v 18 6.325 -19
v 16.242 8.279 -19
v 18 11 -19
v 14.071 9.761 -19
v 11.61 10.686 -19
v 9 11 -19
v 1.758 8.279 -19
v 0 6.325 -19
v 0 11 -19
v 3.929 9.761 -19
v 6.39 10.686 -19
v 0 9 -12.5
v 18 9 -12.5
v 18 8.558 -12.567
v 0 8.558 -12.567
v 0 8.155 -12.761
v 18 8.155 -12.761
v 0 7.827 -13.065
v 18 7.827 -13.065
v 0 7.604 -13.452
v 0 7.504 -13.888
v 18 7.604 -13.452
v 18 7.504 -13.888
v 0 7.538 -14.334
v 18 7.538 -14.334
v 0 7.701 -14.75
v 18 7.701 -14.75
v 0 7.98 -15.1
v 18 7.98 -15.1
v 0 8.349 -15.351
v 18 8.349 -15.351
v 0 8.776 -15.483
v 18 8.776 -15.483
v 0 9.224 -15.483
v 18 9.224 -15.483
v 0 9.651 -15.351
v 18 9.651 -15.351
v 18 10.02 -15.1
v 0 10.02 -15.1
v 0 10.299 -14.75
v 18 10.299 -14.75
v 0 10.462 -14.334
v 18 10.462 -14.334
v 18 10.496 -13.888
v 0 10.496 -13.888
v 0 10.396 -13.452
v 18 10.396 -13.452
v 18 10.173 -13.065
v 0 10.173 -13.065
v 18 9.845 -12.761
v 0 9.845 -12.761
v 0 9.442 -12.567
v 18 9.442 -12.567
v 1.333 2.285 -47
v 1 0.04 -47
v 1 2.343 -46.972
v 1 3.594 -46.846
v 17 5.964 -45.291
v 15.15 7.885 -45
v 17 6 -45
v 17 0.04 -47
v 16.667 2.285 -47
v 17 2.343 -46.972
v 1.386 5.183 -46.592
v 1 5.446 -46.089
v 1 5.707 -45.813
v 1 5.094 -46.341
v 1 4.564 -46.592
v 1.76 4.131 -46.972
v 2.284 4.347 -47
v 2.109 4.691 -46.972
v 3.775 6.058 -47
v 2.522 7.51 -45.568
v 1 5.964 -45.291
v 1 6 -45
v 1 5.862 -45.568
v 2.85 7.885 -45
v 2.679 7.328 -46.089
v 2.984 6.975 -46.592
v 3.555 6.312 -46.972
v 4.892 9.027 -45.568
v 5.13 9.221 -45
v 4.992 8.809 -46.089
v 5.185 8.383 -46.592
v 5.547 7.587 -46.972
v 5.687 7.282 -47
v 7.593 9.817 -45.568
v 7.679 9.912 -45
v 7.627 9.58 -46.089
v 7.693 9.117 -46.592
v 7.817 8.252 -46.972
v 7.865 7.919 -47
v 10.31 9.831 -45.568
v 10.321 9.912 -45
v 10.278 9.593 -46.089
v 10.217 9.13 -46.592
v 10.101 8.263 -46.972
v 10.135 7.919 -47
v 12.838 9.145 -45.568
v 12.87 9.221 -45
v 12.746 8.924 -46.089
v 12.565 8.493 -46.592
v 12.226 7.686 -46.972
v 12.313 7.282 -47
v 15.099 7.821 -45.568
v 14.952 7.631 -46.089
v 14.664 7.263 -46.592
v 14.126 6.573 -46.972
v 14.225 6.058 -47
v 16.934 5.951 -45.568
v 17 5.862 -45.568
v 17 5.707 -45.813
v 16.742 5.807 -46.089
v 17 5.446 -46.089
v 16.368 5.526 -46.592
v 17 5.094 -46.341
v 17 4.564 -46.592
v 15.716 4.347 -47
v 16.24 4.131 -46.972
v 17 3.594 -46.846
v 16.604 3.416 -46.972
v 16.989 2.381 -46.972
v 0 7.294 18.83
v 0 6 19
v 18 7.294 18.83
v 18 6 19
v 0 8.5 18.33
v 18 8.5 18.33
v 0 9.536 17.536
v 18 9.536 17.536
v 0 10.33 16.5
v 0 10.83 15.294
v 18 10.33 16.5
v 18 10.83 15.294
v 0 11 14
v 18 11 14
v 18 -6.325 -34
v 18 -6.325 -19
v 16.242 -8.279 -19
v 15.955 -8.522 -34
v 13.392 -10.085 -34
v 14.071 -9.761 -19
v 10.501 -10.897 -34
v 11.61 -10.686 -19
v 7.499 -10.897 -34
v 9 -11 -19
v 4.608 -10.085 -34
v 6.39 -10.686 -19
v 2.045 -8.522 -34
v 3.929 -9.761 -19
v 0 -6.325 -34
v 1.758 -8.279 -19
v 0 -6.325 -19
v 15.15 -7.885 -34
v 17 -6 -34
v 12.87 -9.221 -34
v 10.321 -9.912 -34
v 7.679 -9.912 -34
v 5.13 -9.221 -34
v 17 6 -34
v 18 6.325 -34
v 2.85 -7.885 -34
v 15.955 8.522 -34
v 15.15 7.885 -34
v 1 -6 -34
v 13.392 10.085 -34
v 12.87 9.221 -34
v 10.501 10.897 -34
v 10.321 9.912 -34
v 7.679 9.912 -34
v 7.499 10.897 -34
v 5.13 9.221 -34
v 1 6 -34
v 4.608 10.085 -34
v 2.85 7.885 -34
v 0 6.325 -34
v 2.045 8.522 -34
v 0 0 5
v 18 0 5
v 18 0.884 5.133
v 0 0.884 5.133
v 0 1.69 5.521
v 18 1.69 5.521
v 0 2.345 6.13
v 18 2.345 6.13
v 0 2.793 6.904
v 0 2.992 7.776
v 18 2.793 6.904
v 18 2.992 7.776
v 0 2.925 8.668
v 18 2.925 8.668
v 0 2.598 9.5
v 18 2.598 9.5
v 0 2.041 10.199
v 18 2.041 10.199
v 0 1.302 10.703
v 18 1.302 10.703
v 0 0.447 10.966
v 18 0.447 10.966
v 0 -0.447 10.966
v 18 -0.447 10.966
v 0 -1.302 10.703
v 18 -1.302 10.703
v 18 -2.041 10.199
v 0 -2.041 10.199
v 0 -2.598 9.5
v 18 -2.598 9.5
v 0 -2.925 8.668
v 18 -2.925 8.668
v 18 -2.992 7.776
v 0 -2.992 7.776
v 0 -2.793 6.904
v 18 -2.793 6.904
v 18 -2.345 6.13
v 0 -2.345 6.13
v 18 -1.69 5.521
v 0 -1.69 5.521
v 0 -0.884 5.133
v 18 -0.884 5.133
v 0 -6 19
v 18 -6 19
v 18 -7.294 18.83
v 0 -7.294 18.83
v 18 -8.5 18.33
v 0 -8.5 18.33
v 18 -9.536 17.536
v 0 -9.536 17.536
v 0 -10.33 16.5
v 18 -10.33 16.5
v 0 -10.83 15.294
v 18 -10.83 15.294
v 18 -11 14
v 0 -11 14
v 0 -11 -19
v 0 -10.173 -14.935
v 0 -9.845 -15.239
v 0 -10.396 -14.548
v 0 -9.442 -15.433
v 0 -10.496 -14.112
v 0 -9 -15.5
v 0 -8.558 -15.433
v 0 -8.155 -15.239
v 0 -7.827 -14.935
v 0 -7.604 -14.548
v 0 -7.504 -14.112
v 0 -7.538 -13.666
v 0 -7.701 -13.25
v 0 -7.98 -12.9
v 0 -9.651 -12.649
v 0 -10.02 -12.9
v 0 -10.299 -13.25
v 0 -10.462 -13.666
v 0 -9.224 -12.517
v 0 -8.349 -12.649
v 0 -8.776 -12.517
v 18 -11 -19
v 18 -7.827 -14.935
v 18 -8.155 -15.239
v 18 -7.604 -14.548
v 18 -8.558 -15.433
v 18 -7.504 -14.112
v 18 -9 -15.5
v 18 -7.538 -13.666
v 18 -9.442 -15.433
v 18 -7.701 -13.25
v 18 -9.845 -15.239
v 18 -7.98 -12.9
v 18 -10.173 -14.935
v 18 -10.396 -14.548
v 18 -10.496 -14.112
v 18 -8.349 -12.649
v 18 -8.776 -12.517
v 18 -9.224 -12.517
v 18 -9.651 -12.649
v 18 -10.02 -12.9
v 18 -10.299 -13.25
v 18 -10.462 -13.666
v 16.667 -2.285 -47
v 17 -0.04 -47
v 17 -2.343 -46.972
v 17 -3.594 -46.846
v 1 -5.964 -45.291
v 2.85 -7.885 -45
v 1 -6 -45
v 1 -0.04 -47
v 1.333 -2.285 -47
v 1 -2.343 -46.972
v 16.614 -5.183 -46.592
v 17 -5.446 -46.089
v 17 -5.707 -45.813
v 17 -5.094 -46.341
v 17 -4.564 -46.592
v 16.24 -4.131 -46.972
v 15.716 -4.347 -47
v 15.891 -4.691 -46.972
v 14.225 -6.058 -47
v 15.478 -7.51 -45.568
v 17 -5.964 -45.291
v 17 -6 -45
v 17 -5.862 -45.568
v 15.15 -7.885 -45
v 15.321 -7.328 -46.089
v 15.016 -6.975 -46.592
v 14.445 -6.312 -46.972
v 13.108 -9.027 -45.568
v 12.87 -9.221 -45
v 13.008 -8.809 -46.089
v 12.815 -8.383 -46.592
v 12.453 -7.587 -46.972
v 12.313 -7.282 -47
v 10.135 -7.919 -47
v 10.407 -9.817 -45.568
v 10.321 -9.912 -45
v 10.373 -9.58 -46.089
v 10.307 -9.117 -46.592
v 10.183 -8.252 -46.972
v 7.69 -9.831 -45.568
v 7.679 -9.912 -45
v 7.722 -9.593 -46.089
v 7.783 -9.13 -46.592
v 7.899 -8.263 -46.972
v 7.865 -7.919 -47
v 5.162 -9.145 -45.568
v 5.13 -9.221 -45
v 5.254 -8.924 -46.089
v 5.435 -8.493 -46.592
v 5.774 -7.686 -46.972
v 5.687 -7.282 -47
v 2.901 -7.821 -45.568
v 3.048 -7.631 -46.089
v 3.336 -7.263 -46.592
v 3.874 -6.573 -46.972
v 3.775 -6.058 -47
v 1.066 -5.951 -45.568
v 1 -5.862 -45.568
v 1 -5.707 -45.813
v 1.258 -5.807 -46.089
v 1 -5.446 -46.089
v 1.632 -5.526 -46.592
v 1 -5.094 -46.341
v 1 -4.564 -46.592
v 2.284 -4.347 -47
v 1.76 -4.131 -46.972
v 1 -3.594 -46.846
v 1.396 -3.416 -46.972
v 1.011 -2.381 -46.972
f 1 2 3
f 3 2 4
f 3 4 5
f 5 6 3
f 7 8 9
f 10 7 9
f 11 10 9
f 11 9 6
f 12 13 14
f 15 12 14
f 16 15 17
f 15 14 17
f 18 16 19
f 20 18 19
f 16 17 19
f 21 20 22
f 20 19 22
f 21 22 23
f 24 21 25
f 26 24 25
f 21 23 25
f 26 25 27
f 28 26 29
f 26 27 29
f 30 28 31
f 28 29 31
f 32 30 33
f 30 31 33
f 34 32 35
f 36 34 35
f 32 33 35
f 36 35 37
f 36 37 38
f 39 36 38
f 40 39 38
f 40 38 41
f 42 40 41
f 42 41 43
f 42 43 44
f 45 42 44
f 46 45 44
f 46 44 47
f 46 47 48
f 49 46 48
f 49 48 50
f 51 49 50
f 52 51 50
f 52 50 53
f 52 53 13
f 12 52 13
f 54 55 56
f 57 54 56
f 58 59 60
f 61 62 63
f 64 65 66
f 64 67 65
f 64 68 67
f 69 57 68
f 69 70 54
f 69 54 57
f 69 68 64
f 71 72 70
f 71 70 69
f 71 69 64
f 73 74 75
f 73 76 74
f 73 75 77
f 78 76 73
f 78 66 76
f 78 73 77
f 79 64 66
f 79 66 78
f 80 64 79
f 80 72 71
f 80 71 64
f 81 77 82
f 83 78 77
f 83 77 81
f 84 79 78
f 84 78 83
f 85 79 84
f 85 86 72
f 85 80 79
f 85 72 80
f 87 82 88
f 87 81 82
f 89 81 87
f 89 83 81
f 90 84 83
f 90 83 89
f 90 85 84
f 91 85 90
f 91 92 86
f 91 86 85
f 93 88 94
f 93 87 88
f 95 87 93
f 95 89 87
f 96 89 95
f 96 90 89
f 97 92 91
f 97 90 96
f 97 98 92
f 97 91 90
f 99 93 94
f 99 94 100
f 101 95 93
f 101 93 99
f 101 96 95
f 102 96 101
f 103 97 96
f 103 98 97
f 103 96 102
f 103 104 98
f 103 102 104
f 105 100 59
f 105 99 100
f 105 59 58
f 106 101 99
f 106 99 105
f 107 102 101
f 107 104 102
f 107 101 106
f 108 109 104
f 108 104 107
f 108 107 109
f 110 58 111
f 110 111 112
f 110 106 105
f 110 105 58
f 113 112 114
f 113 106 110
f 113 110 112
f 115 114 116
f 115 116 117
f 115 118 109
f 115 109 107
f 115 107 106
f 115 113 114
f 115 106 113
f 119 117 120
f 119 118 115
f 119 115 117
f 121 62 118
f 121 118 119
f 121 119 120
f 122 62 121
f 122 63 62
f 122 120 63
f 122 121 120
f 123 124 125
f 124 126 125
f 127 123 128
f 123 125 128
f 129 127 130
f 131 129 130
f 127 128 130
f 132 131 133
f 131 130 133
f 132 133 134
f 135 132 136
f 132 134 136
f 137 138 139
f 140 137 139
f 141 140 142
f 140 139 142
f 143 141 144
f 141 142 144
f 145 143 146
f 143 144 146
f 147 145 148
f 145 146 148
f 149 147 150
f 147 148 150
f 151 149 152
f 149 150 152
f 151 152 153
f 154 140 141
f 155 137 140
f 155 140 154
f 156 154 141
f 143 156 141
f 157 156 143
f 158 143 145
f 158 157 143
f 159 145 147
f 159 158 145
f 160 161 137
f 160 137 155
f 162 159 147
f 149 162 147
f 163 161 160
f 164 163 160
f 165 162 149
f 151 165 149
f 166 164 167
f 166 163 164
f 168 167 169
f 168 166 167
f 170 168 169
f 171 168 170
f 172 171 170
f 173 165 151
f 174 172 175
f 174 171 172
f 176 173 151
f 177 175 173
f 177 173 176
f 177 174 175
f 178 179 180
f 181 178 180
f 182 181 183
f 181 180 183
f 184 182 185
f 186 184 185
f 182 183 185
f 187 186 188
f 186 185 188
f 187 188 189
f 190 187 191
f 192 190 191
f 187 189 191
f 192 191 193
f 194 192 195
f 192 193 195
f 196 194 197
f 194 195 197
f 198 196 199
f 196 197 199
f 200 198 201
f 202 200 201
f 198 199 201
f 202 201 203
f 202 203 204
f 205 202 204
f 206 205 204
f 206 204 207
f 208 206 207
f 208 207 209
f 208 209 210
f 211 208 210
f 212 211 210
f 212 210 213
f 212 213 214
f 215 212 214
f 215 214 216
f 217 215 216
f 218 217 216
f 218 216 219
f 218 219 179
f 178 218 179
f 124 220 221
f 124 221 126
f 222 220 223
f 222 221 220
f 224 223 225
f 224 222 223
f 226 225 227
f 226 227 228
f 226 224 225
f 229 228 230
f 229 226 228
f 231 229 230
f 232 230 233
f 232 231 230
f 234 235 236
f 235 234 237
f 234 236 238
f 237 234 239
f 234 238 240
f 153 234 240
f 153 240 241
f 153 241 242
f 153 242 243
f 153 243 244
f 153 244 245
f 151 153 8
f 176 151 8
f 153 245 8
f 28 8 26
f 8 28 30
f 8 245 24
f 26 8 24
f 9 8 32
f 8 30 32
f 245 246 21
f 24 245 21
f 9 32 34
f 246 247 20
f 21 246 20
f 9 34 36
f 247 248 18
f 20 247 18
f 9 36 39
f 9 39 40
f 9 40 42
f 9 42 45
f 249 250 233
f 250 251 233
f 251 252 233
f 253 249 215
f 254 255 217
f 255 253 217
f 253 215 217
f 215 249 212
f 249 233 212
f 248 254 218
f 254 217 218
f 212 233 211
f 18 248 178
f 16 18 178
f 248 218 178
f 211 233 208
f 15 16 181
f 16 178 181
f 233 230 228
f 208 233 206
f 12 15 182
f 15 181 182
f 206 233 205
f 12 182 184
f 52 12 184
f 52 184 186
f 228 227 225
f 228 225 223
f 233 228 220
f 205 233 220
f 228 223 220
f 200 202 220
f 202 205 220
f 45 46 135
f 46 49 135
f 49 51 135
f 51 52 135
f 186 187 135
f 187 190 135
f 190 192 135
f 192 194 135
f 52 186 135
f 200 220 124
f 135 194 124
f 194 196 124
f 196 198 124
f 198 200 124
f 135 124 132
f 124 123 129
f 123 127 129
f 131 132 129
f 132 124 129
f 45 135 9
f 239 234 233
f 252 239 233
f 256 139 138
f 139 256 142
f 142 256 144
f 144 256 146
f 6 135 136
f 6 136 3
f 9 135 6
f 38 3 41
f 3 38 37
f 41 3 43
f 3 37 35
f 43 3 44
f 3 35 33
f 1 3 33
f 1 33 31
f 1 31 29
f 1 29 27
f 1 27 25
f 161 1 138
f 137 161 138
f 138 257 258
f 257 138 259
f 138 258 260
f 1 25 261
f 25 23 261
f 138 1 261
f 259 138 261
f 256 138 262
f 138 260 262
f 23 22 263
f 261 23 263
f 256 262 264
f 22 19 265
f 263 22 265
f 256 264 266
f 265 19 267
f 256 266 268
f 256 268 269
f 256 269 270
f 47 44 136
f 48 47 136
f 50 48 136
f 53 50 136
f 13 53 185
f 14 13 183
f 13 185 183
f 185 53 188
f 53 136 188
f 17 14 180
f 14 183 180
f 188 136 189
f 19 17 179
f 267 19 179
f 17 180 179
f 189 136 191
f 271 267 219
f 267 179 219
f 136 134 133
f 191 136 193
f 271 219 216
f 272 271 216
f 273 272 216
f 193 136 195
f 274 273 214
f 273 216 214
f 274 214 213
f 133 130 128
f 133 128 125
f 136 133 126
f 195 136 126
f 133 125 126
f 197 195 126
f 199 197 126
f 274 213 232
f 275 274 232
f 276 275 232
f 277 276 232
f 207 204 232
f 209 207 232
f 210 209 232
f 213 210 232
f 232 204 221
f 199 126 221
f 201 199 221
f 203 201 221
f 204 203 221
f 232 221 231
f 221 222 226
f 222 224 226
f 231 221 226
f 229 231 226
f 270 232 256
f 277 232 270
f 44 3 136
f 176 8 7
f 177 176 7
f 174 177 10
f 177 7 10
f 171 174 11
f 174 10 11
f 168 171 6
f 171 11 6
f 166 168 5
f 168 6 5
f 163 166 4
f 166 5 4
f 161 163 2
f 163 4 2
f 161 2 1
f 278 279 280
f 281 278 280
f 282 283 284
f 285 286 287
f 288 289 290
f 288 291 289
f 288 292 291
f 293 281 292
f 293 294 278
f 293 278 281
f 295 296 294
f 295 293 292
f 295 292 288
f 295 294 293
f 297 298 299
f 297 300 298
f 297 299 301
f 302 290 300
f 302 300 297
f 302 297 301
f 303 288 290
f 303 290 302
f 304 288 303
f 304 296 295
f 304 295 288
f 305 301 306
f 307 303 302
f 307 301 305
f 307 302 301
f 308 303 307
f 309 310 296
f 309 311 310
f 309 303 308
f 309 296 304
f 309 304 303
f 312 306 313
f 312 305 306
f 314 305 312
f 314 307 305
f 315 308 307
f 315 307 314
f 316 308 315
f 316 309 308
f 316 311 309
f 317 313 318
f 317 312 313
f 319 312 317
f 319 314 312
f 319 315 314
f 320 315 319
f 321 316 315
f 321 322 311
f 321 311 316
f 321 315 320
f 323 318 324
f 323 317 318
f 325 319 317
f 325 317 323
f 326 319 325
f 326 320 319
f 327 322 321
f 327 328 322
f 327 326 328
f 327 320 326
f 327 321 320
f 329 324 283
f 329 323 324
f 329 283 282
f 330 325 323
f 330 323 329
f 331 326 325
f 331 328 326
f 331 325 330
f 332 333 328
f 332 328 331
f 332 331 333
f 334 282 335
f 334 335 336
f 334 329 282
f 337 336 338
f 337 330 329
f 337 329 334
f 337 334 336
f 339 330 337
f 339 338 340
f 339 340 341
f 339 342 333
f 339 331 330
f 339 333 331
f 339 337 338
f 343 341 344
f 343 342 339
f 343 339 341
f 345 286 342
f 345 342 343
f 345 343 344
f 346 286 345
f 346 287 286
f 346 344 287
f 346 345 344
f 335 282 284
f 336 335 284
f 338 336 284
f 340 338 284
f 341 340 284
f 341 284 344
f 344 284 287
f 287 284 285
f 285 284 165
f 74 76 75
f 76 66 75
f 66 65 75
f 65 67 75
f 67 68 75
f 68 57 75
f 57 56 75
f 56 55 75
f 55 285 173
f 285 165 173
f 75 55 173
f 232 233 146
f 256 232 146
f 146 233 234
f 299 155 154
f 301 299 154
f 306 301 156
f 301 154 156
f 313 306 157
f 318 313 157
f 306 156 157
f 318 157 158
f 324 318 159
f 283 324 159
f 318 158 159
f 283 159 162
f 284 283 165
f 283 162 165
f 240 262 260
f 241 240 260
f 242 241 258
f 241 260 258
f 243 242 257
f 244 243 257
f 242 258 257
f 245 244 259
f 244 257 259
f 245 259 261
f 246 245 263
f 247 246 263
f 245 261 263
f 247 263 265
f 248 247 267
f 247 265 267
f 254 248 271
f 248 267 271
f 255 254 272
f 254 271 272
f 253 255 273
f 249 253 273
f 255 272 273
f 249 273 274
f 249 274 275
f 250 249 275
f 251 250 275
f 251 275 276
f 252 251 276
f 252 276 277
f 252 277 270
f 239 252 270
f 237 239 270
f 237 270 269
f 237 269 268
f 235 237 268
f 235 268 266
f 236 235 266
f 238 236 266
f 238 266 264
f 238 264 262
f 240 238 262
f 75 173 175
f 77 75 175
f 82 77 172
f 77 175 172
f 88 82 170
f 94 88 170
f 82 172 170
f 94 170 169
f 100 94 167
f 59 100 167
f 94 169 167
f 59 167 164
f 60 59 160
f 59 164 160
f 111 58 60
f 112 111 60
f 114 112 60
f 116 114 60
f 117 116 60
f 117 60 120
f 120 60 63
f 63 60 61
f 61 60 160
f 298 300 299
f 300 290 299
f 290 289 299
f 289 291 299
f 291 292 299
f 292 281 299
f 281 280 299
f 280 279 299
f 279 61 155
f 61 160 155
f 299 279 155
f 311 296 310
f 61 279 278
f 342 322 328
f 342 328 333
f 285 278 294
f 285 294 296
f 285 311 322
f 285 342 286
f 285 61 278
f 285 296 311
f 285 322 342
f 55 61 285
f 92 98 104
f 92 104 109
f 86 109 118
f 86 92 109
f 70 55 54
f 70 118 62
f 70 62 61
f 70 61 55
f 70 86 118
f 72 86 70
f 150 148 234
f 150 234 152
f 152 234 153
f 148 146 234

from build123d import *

# Parameters (mm, degrees)
SKETCH1_W           = 38
SKETCH1_H           = 22
BOSS_EXTRUDE1_DEPTH = 18
FILLET1_R           = 5
BOSS_EXTRUDE2_DEPTH = 15
BOSS_EXTRUDE3_DEPTH = 13
FILLET2_R           = 2
SKETCH5_R           = 3
SKETCH5_R_2         = 1.5
CUT_EXTRUDE1_DEPTH  = 52.516987581


with BuildPart() as part:
    # Sketch1 → Boss-Extrude1 (new body)
    with BuildSketch(Plane(origin=(0, 0, 0), x_dir=(0, 0, -1), z_dir=(1, 0, 0))):
        Rectangle(SKETCH1_W, SKETCH1_H)
    extrude(amount=BOSS_EXTRUDE1_DEPTH)

    # Fillet1
    fillet1_edges = [part.edges().sort_by_distance(p)[0] for p in [
        (9, 11, 19),
        (9, -11, 19),
    ]]
    fillet(fillet1_edges, radius=FILLET1_R)

    # Sketch3 → Boss-Extrude2 (add)
    with BuildSketch(Plane(origin=(0, 0, -19), x_dir=(-1, 0, 0), z_dir=(0, 0, -1))):
        with BuildLine():
            Line((-18, 6.32455532), (-18, -6.32455532))
            ThreePointArc((-18, -6.32455532), (-9, -11), (0, -6.32455532))
            Line((0, -6.32455532), (0, 6.32455532))
            ThreePointArc((0, 6.32455532), (-9, 11), (-18, 6.32455532))
        make_face()
    extrude(amount=BOSS_EXTRUDE2_DEPTH)

    # Sketch4 → Boss-Extrude3 (add)
    with BuildSketch(Plane(origin=(0, 0, -34), x_dir=(-1, 0, 0), z_dir=(0, 0, -1))):
        with BuildLine():
            Line((-17, 6), (-17, -6))
            ThreePointArc((-17, -6), (-9, -10), (-1, -6))
            Line((-1, -6), (-1, 6))
            ThreePointArc((-1, 6), (-9, 10), (-17, 6))
        make_face()
    extrude(amount=BOSS_EXTRUDE3_DEPTH)

    # Fillet2
    fillet2_edges = [part.edges().sort_by_distance(p)[0] for p in [
        (9, 10, -47),
        (9, -10, -47),
    ]]
    fillet(fillet2_edges, radius=FILLET2_R - 0.0001)  # a hair under: the kernel refuses the full size

    # Sketch5 → Cut-Extrude1 (cut, through all)
    with BuildSketch(Plane(origin=(18, 0, 0), x_dir=(0, 0, -1), z_dir=(1, 0, 0))):
        with Locations((-8, 0)):
            Circle(SKETCH5_R)
        with Locations((14, -9)):
            Circle(SKETCH5_R_2)
        with Locations(Location((14, 9, 0), (0, 0, 180))):
            Circle(SKETCH5_R_2)
    extrude(amount=-CUT_EXTRUDE1_DEPTH, mode=Mode.SUBTRACT)


solid = part.part
